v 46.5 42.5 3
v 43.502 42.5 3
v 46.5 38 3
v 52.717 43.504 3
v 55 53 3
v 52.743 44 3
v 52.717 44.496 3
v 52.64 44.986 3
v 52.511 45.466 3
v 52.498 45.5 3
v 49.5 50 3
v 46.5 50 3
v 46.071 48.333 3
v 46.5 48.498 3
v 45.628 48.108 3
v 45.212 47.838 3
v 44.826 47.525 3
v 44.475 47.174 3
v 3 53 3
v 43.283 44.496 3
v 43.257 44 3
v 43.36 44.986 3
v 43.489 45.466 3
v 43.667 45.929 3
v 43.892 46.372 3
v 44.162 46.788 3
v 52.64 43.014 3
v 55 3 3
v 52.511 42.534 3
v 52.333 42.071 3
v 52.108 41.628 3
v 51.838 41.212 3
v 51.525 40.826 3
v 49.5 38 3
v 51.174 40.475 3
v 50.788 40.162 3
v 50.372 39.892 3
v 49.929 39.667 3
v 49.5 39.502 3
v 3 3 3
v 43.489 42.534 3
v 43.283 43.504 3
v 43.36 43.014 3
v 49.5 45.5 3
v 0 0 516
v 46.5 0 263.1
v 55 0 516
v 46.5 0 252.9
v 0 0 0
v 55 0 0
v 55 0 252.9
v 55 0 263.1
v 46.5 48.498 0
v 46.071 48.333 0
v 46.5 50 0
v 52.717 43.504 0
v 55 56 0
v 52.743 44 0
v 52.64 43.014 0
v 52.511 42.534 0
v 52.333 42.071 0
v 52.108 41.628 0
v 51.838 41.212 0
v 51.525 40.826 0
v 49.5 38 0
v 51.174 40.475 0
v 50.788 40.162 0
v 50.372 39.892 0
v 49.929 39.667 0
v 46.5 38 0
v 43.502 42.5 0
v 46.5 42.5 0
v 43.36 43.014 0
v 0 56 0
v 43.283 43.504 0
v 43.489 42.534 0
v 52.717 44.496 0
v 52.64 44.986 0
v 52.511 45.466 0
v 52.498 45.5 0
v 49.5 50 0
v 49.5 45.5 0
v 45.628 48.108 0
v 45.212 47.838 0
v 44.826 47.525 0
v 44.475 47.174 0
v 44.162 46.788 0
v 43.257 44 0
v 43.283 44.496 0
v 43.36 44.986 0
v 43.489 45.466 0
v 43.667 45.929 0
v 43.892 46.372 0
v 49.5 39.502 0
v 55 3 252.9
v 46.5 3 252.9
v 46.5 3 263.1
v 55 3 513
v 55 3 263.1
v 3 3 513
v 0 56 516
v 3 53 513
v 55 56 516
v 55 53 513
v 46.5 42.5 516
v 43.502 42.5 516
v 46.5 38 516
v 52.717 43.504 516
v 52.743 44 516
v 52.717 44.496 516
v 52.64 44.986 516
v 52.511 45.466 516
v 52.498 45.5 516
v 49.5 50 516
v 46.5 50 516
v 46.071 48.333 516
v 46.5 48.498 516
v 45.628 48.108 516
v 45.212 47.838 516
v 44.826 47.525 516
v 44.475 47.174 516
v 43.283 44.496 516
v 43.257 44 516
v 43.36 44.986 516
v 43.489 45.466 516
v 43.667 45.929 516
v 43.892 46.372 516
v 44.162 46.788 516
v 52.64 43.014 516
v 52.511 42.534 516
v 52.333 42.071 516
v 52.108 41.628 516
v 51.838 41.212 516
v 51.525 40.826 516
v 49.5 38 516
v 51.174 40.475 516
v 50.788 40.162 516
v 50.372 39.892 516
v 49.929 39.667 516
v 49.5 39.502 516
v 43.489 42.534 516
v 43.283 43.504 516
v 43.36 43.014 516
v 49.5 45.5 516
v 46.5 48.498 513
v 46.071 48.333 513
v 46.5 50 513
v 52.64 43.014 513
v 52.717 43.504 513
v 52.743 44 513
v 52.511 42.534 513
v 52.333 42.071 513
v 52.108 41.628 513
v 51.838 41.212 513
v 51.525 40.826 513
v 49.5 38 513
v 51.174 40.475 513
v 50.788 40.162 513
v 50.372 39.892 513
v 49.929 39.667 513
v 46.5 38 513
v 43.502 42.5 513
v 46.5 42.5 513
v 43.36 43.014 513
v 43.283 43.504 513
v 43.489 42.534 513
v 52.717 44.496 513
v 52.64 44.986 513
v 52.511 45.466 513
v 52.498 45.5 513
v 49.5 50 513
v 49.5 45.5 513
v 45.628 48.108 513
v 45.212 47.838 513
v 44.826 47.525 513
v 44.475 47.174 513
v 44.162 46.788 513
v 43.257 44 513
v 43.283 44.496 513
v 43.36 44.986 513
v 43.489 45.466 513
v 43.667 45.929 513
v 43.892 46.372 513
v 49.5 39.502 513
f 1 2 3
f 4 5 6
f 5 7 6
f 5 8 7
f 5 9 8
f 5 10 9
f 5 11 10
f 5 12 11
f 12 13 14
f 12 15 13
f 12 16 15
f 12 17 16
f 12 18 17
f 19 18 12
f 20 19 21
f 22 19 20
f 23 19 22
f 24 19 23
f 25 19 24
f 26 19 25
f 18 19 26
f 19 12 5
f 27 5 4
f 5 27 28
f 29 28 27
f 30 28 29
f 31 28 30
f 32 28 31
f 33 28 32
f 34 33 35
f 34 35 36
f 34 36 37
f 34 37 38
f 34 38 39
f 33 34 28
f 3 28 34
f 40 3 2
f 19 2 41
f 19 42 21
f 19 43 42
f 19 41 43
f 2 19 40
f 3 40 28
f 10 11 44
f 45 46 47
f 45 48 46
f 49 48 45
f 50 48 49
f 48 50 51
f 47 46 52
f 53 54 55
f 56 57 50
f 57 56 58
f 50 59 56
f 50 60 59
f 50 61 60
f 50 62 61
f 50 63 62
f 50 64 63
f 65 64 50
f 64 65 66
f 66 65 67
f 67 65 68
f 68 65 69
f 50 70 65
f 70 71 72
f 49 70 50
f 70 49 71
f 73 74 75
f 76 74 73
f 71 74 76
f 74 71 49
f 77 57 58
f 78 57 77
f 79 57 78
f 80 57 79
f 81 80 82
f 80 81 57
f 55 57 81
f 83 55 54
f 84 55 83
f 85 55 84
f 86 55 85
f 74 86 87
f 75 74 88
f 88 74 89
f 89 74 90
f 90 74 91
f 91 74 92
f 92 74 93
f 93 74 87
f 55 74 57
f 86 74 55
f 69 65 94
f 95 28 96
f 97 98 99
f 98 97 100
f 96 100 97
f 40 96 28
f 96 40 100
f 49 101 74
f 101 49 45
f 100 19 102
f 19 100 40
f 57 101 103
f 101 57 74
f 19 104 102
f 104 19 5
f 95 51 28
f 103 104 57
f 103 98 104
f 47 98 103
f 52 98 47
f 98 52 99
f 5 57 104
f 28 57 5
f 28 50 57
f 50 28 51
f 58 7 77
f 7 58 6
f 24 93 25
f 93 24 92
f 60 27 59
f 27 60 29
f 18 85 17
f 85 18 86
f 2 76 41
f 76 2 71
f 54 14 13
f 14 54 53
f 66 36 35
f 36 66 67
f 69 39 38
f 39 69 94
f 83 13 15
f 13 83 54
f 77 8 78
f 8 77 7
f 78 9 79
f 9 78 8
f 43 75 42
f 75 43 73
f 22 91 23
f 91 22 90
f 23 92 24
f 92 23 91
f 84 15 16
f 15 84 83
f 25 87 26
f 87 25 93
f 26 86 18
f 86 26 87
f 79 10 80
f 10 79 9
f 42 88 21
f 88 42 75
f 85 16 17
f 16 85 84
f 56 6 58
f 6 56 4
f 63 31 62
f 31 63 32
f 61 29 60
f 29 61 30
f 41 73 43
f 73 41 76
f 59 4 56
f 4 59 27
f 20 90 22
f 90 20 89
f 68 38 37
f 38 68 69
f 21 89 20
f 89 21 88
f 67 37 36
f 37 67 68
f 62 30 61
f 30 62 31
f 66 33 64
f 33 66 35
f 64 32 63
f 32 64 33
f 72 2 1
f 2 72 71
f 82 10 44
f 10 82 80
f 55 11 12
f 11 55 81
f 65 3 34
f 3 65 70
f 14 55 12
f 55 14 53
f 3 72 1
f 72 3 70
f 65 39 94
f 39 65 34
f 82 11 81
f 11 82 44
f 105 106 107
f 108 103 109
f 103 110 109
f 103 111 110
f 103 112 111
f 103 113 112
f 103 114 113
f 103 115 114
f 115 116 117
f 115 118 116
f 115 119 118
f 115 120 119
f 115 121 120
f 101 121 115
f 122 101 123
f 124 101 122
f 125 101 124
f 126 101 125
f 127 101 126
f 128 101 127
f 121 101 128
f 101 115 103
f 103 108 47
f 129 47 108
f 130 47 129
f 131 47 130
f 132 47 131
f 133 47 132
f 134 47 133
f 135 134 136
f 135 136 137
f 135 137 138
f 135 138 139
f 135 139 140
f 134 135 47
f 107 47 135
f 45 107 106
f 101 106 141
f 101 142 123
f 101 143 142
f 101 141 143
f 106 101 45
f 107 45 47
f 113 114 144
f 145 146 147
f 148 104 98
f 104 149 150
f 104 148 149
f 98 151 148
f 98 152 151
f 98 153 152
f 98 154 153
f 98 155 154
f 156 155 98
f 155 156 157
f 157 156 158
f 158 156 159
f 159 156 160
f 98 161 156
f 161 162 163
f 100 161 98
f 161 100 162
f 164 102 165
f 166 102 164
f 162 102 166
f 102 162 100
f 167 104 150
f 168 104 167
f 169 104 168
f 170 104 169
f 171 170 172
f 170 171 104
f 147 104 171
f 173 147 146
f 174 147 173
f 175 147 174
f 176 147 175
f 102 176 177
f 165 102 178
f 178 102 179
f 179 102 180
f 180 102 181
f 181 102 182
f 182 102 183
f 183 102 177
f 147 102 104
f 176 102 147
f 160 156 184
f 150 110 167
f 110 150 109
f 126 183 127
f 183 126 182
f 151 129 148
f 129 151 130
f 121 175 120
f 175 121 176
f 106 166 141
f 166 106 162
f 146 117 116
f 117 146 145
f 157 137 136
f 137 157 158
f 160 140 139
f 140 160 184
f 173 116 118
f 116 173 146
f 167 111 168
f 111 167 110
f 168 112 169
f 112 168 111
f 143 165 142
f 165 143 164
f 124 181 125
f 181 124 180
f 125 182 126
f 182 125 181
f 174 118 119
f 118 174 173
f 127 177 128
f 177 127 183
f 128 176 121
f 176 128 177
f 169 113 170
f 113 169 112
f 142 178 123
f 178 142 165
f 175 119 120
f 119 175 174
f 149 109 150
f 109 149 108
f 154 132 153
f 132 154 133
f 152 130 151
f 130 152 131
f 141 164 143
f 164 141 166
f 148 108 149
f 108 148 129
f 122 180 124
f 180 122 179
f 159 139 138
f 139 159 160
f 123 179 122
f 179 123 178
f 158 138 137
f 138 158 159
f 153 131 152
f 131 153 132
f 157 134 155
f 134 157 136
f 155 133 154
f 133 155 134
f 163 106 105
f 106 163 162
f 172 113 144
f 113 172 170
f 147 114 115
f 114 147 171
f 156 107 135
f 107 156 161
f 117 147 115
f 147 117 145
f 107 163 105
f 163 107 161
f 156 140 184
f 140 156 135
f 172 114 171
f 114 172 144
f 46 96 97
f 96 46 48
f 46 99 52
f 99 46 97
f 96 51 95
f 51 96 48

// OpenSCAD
include <lasercut.scad>; 

$fn = 60;

thickness = 3.0;
z = 510 + 2 * thickness;
y0 = 50;
y = y0 + 2 * thickness;
x = 55;

holder_width = 10;
holder_height = 8.5;

x_twist = 12;

twist_array = [[DOWN, x - holder_height - thickness / 2, y - x_twist / 2 - 3 * thickness, x_twist, 3 * thickness]];

manifoldCorrection = 0.1;



module fillet(smooth) {
   offset(r = smooth) {
     offset(delta = -smooth) {
       children();
     }
   }
}


module panelSquare() {
    translate([thickness, thickness])
    square([y - 2.5 * thickness, z - 2 * thickness], center=false);
    holder_ledge = thickness + 2;
    translate([holder_ledge / 2, z / 2])
    square([2 * holder_ledge + manifoldCorrection, holder_width + 0.25], center=true);
}


module panel2d() {
    x_twist_ledge = 3;
    fillet(1)
    union() {
        panelSquare();

        
        translate([y - x_twist / 2 - 3 * thickness - x_twist / 2 + thickness, -x_twist_ledge])
        projection()
        lasercutoutSquare(thickness=thickness, x=x_twist, y=z + 2 * x_twist_ledge,
            twist_connect=[
                [RIGHT,0,x_twist_ledge,2*thickness - manifoldCorrection],
                [RIGHT,0,z - thickness + x_twist_ledge,2*thickness - manifoldCorrection],
            ]
        );
    }
}



module panel3d() {
    translate([x - holder_height, 0, 0])
    rotate([90, 0, 90])
    linear_extrude(height=thickness)
    panel2d();
}




module box() {
    lasercutoutBox(thickness = thickness, x=x, y=y, z=z,
        sides=5, num_fingers=2,
        twist_holes_a=[
            twist_array,
            twist_array,
        ],
        cutouts_a = [[], [], 
                [[x - holder_height - thickness, z/2 - holder_width/2 - thickness - manifoldCorrection, holder_height + manifoldCorrection, holder_width + 2 * manifoldCorrection]]
            ]
    );
}

//panelSquare();
box();
%panel3d();
